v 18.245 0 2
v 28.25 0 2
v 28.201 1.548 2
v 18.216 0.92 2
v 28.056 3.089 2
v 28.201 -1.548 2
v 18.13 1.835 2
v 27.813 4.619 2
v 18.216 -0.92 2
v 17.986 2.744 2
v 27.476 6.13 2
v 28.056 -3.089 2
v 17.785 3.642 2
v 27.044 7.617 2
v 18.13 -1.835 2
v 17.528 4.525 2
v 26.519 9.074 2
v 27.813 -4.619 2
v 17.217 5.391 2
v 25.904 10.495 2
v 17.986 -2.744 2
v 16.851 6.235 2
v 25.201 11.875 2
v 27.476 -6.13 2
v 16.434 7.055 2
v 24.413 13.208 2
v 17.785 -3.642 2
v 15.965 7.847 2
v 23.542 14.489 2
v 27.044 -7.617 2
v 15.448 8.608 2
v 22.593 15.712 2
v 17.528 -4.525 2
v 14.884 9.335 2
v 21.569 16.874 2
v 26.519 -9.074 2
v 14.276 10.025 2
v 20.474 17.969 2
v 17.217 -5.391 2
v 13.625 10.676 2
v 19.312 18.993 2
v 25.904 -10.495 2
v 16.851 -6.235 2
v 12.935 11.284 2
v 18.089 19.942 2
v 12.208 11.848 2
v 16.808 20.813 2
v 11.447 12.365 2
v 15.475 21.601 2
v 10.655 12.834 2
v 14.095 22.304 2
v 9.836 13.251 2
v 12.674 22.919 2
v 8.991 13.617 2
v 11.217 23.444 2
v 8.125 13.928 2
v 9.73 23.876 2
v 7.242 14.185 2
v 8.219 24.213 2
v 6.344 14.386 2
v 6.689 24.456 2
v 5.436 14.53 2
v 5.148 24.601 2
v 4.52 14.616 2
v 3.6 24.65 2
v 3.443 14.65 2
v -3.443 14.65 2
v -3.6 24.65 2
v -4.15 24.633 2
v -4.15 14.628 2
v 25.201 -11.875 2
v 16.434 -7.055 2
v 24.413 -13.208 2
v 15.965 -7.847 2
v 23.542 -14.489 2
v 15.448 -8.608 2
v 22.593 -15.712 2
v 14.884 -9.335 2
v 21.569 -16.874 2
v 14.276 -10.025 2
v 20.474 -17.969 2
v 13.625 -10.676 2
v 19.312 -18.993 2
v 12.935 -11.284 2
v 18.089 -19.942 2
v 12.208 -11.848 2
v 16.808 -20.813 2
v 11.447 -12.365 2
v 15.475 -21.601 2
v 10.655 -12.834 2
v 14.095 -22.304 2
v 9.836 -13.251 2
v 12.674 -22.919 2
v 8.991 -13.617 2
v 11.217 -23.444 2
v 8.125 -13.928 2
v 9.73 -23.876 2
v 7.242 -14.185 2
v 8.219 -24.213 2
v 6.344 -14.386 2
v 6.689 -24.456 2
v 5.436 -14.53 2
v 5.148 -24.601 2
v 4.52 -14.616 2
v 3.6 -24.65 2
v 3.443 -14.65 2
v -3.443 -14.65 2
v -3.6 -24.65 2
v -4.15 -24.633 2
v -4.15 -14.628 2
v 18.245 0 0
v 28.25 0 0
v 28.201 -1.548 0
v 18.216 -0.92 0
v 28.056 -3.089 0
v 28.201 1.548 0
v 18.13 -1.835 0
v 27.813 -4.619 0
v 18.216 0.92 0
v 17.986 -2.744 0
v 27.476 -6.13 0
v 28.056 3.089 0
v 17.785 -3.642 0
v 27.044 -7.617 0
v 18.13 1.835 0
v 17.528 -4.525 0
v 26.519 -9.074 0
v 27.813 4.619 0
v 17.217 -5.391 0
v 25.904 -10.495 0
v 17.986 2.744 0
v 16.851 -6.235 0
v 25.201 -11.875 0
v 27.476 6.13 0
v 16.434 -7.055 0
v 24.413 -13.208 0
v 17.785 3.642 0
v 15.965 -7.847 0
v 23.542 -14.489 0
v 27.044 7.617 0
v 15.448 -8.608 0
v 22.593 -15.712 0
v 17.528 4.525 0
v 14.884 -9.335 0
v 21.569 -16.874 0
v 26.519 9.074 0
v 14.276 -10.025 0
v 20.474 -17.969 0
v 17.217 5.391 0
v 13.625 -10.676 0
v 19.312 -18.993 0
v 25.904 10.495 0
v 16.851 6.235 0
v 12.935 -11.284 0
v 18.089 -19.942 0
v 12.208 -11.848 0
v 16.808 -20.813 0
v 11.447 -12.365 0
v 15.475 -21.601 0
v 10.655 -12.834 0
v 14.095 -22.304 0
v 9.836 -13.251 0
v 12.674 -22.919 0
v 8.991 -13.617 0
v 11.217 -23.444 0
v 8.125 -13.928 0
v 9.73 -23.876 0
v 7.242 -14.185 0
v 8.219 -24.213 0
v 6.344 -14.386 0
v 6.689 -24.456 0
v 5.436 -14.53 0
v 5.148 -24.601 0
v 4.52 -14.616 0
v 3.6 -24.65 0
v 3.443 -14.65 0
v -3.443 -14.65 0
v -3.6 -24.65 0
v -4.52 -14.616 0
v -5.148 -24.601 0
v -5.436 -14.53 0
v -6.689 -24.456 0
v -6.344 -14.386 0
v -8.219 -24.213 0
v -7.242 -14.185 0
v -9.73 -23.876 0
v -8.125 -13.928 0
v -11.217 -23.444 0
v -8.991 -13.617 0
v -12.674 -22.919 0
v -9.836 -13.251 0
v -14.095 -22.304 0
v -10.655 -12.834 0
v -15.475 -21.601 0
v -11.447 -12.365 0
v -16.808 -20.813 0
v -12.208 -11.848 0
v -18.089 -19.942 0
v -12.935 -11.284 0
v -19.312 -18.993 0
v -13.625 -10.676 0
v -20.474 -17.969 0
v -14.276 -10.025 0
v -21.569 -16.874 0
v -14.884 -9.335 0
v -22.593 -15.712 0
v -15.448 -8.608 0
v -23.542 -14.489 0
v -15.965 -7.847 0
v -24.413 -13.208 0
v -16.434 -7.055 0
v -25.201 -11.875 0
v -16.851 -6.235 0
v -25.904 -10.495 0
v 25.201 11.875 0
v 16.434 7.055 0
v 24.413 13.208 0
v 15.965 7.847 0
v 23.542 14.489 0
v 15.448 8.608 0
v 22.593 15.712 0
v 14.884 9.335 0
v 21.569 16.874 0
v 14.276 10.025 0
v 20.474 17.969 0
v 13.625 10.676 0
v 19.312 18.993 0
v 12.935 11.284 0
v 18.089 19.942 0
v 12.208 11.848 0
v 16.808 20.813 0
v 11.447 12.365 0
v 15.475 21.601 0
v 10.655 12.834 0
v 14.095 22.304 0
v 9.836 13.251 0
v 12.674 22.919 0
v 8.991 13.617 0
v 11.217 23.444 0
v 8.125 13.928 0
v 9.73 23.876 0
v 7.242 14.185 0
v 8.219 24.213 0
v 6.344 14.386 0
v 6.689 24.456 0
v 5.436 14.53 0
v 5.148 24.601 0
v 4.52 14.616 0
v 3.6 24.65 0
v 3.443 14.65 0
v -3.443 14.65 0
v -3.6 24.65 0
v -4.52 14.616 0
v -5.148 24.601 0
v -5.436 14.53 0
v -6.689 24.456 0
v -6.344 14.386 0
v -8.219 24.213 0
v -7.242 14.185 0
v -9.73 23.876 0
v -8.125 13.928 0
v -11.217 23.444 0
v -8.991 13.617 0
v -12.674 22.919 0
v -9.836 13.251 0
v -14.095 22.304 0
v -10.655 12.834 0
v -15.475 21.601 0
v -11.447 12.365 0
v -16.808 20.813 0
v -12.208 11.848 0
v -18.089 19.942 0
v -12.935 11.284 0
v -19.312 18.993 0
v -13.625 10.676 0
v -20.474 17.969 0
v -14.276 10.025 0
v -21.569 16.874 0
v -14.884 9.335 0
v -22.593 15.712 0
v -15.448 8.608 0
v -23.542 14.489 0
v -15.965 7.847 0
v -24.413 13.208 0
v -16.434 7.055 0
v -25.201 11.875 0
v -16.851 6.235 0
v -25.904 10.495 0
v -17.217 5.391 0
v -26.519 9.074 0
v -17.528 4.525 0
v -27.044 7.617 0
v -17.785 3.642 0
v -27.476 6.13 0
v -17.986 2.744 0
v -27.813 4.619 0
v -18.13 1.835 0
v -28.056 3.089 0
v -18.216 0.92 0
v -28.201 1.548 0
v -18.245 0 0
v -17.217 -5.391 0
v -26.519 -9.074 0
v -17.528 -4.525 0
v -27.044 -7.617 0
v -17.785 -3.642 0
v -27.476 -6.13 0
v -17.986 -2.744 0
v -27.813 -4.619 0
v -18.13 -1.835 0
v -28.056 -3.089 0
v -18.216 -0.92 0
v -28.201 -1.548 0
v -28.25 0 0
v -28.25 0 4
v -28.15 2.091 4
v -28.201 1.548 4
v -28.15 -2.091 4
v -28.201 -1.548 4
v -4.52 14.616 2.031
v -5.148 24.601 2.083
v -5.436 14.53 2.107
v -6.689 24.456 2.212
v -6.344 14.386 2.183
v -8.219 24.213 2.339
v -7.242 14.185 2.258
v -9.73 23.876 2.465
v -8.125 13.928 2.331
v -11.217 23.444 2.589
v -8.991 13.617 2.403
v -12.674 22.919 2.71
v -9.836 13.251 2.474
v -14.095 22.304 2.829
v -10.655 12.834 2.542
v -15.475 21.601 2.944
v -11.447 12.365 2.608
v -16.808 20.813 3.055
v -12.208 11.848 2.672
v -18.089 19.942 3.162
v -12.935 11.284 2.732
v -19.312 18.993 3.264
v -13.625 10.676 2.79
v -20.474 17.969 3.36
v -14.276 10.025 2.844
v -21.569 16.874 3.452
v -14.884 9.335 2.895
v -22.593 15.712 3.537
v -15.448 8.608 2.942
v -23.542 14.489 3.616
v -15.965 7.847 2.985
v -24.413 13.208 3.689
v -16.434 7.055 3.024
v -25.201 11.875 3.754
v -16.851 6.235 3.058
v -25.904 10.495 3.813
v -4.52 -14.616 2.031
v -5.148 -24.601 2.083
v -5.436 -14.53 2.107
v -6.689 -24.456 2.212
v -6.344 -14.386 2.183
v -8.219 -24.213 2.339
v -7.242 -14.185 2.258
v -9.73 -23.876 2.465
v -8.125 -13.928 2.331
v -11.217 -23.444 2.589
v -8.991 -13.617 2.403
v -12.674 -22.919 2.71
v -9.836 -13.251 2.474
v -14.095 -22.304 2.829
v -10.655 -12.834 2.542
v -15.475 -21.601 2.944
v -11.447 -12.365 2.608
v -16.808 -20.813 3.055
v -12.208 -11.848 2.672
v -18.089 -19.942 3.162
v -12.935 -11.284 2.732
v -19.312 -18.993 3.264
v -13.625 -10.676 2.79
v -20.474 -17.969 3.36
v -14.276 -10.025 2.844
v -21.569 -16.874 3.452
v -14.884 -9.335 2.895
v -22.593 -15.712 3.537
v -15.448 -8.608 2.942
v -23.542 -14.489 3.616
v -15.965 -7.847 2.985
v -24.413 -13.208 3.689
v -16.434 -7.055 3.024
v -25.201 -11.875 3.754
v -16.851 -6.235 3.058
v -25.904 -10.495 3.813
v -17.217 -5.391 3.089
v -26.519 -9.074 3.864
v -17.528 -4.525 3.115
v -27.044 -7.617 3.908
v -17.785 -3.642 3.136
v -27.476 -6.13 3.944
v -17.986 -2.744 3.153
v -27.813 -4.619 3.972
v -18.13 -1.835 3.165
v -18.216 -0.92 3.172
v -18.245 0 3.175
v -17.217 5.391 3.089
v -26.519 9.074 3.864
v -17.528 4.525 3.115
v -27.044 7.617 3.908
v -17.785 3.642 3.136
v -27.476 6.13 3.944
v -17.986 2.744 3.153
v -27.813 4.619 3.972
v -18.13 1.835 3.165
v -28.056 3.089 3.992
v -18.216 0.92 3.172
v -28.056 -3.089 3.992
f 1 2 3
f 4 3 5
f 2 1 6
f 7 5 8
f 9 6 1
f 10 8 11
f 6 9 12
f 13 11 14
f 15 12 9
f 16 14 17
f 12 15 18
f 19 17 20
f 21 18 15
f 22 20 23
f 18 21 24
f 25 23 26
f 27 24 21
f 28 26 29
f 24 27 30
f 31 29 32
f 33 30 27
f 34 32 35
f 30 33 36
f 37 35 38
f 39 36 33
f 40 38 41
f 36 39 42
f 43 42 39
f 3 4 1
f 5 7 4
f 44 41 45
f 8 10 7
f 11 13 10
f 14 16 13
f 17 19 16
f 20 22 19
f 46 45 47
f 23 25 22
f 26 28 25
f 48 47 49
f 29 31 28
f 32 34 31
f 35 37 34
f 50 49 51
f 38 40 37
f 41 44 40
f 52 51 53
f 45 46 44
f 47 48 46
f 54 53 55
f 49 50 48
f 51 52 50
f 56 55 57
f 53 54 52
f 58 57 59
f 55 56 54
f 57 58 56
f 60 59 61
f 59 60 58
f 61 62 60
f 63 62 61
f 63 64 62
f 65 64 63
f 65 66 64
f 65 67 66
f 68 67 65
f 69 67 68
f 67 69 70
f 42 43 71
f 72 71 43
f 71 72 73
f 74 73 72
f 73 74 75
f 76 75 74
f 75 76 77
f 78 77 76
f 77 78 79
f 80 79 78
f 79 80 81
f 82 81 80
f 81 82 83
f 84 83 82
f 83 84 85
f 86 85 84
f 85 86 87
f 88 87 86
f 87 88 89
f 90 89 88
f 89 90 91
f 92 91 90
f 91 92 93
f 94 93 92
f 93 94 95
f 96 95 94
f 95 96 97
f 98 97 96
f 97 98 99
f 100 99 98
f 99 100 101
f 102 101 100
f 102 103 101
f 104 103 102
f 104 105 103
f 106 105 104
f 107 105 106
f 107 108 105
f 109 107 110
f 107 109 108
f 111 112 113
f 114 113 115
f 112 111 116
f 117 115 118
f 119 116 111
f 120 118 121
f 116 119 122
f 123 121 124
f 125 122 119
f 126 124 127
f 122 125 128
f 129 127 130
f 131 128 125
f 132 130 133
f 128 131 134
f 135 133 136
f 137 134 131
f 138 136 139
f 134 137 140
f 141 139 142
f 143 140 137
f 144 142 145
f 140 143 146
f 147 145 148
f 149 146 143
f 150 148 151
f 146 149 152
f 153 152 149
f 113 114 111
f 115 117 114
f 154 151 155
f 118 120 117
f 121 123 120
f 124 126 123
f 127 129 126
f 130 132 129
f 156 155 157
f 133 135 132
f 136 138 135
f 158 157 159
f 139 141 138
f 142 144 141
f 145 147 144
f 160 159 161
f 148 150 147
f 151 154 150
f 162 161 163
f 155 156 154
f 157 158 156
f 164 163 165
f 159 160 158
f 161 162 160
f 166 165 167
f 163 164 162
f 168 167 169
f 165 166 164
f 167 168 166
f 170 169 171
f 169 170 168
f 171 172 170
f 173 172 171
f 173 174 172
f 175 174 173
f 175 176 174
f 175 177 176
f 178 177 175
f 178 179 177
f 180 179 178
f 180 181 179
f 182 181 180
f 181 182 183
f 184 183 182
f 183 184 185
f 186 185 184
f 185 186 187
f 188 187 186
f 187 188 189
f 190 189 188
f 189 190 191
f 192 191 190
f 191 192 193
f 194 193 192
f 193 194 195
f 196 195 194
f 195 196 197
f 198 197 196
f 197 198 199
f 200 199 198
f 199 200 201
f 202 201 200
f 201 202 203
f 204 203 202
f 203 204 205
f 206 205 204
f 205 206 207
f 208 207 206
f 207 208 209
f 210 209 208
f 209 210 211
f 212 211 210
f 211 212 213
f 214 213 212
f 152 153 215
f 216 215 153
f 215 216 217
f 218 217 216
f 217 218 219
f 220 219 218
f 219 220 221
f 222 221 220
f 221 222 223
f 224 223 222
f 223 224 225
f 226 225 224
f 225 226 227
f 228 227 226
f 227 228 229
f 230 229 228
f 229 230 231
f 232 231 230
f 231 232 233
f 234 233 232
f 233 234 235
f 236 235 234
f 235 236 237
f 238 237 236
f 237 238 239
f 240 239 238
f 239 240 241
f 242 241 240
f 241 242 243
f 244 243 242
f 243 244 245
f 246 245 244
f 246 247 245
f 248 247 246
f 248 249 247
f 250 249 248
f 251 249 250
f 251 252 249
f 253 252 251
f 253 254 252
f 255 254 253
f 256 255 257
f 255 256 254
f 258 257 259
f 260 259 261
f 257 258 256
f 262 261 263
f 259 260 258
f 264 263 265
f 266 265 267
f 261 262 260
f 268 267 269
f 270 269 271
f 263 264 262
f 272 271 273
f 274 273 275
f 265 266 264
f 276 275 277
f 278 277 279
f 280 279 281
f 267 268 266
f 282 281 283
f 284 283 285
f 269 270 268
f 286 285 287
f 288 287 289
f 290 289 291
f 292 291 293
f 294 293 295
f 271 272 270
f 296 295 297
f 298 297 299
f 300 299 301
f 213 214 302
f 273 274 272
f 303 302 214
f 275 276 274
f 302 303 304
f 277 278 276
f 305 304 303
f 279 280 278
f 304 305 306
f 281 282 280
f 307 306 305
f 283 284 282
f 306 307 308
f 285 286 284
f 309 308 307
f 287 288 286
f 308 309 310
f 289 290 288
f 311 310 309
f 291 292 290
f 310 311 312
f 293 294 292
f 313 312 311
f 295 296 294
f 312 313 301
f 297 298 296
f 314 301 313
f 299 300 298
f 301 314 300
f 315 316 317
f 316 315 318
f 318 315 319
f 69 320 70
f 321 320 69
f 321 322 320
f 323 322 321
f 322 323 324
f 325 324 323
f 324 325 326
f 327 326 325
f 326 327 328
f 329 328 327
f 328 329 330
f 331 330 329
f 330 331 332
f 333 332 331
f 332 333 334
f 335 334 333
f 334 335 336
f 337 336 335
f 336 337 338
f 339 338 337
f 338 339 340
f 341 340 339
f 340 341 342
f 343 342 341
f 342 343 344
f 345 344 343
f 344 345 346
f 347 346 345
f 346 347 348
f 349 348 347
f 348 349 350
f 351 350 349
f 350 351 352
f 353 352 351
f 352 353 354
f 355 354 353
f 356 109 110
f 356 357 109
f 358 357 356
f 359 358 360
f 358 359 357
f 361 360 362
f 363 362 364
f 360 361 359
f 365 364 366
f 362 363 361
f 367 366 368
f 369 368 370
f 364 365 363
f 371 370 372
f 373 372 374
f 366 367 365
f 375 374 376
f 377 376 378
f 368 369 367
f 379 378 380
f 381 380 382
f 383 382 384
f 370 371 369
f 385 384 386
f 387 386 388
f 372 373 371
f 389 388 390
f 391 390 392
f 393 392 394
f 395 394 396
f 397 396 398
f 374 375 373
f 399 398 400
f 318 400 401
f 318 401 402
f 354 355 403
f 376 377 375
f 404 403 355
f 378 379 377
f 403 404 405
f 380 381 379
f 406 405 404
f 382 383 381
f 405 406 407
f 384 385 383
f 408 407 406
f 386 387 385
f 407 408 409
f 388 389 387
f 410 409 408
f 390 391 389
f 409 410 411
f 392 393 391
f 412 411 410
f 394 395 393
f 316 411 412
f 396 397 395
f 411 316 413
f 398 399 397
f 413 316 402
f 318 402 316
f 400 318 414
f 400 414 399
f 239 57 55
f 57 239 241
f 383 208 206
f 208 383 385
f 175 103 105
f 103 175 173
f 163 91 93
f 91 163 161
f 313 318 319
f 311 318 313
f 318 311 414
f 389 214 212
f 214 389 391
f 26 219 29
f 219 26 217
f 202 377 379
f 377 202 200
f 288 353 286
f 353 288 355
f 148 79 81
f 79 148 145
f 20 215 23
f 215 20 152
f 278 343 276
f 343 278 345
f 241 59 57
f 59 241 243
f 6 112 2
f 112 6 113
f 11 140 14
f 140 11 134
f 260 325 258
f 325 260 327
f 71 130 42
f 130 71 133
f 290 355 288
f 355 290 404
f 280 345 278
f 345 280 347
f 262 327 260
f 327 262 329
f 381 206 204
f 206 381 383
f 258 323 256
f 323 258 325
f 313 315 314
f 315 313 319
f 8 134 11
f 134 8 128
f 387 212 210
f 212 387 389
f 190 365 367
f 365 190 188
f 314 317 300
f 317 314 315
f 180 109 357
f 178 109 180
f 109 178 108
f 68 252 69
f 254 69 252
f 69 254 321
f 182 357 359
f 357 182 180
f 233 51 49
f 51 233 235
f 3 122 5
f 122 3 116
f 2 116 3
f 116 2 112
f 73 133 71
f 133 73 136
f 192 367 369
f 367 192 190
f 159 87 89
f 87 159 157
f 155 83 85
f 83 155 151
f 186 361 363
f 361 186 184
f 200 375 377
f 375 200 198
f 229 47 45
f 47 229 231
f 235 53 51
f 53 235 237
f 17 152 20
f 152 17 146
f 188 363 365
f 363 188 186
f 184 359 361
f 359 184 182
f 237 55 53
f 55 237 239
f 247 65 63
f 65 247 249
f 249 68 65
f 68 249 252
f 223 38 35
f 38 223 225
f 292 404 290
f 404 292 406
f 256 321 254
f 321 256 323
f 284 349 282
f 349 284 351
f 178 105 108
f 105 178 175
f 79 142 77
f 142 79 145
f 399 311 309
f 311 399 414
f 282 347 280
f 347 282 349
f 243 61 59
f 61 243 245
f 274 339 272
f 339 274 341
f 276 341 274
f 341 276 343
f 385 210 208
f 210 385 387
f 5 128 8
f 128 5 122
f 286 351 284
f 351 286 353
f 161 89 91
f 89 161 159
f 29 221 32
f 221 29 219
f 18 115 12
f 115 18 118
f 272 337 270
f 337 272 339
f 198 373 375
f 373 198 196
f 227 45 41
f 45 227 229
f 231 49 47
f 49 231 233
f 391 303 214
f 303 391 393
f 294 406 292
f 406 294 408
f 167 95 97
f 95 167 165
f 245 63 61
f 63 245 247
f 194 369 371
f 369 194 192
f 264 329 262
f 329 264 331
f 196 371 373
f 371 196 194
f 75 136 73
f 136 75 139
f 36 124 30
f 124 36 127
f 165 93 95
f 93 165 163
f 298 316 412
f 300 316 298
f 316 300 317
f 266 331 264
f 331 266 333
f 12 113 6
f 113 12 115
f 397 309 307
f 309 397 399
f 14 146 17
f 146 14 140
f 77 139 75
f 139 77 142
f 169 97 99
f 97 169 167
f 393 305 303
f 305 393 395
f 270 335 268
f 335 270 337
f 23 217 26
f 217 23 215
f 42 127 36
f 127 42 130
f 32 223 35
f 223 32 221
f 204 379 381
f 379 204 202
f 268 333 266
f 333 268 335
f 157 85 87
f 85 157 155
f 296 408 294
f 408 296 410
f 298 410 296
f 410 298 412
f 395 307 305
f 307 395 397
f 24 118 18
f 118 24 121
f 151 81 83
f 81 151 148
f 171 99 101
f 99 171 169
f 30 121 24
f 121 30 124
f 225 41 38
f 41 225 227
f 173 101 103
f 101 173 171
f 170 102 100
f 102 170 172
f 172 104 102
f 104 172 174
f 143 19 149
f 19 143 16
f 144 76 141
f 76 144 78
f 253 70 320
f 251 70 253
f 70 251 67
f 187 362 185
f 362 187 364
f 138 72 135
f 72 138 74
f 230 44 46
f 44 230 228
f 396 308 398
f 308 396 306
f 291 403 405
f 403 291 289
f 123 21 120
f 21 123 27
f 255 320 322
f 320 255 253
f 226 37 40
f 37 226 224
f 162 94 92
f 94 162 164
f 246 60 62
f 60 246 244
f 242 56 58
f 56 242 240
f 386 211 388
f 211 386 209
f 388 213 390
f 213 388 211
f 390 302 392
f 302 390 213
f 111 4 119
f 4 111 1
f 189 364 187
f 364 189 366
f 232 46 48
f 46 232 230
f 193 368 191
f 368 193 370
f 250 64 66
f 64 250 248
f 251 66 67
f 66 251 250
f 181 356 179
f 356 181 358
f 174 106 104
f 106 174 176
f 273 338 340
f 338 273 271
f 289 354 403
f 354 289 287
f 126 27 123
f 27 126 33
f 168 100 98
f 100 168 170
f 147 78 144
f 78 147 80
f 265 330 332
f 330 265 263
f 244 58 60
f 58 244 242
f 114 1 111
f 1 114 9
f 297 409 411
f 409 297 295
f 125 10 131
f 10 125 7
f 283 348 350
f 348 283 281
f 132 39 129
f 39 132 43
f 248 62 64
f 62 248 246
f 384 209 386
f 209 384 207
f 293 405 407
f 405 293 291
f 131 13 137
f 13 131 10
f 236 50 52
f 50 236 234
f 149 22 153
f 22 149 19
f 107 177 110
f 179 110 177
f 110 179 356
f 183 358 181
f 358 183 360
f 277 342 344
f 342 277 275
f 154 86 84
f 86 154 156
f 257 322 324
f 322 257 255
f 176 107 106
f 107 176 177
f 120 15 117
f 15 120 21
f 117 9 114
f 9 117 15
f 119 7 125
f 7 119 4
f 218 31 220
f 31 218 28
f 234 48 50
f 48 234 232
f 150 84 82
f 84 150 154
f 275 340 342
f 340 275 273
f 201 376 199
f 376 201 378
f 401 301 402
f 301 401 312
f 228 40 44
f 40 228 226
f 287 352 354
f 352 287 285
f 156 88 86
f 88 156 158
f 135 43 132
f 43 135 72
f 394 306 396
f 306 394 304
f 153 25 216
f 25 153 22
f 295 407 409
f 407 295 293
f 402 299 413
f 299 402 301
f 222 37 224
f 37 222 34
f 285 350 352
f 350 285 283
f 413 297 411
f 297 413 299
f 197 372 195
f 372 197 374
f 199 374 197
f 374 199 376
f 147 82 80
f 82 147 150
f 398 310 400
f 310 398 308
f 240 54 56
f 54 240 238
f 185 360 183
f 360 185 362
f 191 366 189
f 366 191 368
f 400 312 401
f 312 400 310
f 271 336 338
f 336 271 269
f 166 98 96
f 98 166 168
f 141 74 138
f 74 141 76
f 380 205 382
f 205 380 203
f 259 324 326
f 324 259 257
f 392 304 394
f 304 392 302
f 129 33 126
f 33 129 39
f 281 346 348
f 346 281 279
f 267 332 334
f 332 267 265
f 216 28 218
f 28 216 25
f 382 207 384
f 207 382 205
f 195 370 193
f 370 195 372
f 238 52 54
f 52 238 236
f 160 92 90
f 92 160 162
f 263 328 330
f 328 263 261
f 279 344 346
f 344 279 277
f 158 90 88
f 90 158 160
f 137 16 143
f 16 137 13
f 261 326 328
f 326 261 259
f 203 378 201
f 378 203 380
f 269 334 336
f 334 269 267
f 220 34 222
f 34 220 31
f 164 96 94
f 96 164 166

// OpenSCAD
// IKEA BROGRUND Faucet Custom Washer
// Version: 0.04
// Date: 2026-01-18

/* [Dimensions] */
// Total length of the faucet base
base_length = 56.5; 
// Width of the base (and diameter of the rounded ends)
base_width = 49.3; 
// Minimum thickness (the flat part)
thickness_min = 2.0; 
// Maximum thickness at the thick end
thickness_max = 4.0; 
// Distance from the end where the thickening begins
wedge_length = 24.0; 
// Wall thickness (width of the "ring")
wall_width = 10.0; 

/* [Rendering Quality] */
$fn = 100;

module brogrund_washer_v0_04() {
    difference() {
        // 1. The Main Solid Body
        intersection() {
            linear_extrude(height = thickness_max + 1) {
                washer_profile(0); // Outer profile
            }
            
            union() {
                // Flat portion (from 24mm mark to far right)
                translate([-(base_length/2) + wedge_length, -base_width/2, 0])
                cube([base_length - wedge_length, base_width, thickness_min]);
                
                // Sloped portion (from far left to 24mm mark)
                hull() {
                    translate([-base_length/2, -base_width/2, 0])
                    cube([0.1, base_width, thickness_max]);
                    
                    translate([-base_length/2 + wedge_length, -base_width/2, 0])
                    cube([0.1, base_width, thickness_min]);
                }
            }
        }

        // 2. The Central Opening
        // Subtracted through the entire height
        translate([0, 0, -1])
        linear_extrude(height = thickness_max + 2) {
            washer_profile(-wall_width); // Inner profile
        }
    }
}

// 2D Profile (Stadium Shape) with optional offset for the hole
module washer_profile(offset_val) {
    // The length of the internal rectangle needs to be adjusted 
    // to maintain the total length after the offset is applied
    internal_dist = (base_length - base_width);
    
    offset(r = offset_val) {
        hull() {
            translate([-internal_dist/2, 0, 0])
            circle(d = base_width);
            
            translate([internal_dist/2, 0, 0])
            circle(d = base_width);
        }
    }
}

// Render
brogrund_washer_v0_04();
